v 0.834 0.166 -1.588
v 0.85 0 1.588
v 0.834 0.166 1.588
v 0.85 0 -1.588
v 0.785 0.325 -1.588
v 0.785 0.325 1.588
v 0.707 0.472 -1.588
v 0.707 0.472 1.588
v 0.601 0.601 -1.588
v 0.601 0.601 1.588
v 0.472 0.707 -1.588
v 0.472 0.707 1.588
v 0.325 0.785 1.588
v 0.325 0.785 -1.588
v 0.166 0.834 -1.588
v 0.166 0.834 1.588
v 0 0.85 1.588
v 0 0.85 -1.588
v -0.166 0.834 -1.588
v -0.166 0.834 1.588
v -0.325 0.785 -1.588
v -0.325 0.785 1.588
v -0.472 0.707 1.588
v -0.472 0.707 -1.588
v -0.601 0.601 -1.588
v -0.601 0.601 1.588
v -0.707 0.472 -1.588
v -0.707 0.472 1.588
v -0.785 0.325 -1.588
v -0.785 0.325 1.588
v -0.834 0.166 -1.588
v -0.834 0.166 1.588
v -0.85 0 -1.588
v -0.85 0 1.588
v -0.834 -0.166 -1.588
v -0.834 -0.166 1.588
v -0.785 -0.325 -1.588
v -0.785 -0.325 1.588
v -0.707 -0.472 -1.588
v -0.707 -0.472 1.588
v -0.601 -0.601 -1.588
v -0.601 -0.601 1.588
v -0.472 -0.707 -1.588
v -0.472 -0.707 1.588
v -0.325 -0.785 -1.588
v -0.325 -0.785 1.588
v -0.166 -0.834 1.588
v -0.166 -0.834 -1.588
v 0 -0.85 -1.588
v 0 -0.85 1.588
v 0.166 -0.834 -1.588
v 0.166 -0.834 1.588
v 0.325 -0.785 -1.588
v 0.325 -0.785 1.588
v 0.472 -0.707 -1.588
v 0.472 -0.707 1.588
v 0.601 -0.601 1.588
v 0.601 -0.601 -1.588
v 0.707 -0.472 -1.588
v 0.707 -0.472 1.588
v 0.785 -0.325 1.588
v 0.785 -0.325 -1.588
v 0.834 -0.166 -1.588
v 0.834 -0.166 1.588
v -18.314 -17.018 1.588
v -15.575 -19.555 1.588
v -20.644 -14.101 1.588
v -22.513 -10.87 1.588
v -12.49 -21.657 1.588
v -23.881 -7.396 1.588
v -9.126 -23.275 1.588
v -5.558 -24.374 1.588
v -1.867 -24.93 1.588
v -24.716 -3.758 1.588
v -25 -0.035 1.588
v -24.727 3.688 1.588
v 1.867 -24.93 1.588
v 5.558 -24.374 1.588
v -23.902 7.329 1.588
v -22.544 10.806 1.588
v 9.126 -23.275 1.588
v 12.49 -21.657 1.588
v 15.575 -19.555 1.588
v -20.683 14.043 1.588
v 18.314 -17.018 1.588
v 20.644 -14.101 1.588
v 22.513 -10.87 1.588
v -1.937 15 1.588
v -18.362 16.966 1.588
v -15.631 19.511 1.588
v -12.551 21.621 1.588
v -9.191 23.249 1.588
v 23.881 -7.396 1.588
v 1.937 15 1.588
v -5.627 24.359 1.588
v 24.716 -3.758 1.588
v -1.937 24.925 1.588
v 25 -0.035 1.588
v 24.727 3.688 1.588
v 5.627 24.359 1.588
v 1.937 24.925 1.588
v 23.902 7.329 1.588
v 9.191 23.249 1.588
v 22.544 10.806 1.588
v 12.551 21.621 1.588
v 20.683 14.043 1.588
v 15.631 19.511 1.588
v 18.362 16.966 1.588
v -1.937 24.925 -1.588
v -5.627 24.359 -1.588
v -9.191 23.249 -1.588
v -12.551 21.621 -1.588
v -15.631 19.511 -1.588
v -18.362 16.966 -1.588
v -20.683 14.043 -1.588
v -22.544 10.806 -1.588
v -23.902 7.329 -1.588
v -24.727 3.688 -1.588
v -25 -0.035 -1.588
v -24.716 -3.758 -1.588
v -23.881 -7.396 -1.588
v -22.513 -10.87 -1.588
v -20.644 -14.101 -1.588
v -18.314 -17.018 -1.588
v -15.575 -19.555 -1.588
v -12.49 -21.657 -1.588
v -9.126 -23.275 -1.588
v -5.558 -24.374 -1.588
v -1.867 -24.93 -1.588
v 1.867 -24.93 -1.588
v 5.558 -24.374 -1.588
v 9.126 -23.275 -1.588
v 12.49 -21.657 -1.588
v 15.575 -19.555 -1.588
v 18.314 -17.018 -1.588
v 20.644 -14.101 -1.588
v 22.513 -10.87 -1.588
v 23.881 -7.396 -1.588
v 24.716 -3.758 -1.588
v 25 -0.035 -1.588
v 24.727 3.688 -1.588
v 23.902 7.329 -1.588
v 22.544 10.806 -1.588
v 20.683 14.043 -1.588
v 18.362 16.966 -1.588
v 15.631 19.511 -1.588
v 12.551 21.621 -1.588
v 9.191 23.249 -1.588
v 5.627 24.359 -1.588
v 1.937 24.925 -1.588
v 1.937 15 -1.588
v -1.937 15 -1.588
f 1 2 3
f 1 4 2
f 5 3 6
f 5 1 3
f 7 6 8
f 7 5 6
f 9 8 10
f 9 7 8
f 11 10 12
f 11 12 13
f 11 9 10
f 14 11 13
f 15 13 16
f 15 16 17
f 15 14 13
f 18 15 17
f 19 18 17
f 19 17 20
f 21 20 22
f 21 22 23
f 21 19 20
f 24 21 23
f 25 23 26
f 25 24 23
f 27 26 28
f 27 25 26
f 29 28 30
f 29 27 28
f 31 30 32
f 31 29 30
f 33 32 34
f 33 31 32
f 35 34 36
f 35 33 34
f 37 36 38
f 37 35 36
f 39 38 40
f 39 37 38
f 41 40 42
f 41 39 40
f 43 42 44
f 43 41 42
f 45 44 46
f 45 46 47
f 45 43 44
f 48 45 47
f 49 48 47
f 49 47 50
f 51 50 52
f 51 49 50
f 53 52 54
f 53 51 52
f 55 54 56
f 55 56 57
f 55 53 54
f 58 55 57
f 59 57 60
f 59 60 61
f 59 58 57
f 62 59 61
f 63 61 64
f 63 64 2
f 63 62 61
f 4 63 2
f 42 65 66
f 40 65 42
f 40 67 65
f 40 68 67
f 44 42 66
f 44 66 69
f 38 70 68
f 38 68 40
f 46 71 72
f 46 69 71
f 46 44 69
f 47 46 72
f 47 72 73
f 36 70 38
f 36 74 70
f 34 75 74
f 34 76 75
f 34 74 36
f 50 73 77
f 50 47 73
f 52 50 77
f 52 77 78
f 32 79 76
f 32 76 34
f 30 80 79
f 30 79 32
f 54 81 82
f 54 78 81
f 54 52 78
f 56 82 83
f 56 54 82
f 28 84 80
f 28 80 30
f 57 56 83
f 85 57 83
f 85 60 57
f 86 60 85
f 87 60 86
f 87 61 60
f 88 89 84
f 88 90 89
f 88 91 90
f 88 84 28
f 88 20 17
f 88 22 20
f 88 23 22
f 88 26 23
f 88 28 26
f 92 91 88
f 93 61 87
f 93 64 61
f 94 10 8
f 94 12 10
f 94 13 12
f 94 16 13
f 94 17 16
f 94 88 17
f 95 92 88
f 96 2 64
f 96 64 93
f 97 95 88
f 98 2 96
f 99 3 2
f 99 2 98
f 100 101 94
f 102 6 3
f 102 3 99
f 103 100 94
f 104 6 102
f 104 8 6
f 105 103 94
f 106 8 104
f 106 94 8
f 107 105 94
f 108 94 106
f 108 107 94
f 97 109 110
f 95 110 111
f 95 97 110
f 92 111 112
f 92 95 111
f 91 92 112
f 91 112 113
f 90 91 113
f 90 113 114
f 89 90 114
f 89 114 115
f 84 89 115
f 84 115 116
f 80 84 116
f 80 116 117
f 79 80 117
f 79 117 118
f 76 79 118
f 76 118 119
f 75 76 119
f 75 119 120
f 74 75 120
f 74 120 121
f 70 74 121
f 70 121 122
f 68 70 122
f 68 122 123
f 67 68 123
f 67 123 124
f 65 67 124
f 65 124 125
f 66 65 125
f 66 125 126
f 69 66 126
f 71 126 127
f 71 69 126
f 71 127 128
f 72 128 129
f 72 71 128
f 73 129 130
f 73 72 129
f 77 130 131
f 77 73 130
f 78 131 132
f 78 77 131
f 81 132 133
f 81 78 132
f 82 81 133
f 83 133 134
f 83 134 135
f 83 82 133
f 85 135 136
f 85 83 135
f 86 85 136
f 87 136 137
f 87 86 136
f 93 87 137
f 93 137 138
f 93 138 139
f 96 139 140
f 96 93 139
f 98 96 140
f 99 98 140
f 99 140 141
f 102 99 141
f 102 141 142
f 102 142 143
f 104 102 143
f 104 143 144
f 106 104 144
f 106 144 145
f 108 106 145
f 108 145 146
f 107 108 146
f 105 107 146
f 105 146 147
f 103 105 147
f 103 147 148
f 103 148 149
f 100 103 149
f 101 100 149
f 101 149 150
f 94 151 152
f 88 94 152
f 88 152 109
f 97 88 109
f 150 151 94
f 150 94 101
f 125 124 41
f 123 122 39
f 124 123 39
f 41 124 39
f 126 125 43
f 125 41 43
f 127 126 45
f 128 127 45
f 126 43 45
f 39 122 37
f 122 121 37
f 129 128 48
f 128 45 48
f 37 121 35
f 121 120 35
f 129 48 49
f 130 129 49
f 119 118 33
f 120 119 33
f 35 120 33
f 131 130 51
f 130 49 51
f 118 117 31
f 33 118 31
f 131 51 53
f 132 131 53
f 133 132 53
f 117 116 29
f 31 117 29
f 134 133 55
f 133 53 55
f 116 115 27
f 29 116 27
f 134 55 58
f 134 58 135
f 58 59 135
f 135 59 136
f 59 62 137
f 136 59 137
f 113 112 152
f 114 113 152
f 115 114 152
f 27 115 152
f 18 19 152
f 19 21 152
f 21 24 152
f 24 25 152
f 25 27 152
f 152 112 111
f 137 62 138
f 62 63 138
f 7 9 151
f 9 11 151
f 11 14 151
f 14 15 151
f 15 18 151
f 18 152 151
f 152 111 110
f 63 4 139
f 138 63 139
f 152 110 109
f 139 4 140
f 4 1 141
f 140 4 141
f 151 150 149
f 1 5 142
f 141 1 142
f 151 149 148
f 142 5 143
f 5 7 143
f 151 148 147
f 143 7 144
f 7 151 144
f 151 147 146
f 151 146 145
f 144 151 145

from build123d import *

# Parameters (mm, degrees)
SKETCH1_R           = 25
SKETCH1_R_2         = 0.85
BOSS_EXTRUDE1_DEPTH = 1.5875
CUT_EXTRUDE1_REACH  = 5.175
SKETCH2_W           = 3.873993702
SKETCH2_H           = 19.044786736


with BuildPart() as part:
    # Sketch1 → Boss-Extrude1 (new body, symmetric)
    with BuildSketch(Plane.XY):
        Circle(SKETCH1_R)
        Circle(SKETCH1_R_2, mode=Mode.SUBTRACT)
    extrude(amount=BOSS_EXTRUDE1_DEPTH, both=True)

    # Sketch2 → Cut-Extrude1 (cut, up to next)
    with BuildSketch(Plane(origin=(0, 0, -1.5875), x_dir=(-1, 0, 0), z_dir=(0, 0, -1)), mode=Mode.PRIVATE) as cut_extrude1_sk1:
        with Locations((0, 24.522393368)):
            Rectangle(SKETCH2_W, SKETCH2_H)
    cut_extrude1_tool1 = extrude(cut_extrude1_sk1.sketch, amount=-CUT_EXTRUDE1_REACH, mode=Mode.PRIVATE) & part.part
    add(cut_extrude1_tool1.solids().sort_by_distance((0, 24.522393, -1.5875))[0], mode=Mode.SUBTRACT)


solid = part.part
